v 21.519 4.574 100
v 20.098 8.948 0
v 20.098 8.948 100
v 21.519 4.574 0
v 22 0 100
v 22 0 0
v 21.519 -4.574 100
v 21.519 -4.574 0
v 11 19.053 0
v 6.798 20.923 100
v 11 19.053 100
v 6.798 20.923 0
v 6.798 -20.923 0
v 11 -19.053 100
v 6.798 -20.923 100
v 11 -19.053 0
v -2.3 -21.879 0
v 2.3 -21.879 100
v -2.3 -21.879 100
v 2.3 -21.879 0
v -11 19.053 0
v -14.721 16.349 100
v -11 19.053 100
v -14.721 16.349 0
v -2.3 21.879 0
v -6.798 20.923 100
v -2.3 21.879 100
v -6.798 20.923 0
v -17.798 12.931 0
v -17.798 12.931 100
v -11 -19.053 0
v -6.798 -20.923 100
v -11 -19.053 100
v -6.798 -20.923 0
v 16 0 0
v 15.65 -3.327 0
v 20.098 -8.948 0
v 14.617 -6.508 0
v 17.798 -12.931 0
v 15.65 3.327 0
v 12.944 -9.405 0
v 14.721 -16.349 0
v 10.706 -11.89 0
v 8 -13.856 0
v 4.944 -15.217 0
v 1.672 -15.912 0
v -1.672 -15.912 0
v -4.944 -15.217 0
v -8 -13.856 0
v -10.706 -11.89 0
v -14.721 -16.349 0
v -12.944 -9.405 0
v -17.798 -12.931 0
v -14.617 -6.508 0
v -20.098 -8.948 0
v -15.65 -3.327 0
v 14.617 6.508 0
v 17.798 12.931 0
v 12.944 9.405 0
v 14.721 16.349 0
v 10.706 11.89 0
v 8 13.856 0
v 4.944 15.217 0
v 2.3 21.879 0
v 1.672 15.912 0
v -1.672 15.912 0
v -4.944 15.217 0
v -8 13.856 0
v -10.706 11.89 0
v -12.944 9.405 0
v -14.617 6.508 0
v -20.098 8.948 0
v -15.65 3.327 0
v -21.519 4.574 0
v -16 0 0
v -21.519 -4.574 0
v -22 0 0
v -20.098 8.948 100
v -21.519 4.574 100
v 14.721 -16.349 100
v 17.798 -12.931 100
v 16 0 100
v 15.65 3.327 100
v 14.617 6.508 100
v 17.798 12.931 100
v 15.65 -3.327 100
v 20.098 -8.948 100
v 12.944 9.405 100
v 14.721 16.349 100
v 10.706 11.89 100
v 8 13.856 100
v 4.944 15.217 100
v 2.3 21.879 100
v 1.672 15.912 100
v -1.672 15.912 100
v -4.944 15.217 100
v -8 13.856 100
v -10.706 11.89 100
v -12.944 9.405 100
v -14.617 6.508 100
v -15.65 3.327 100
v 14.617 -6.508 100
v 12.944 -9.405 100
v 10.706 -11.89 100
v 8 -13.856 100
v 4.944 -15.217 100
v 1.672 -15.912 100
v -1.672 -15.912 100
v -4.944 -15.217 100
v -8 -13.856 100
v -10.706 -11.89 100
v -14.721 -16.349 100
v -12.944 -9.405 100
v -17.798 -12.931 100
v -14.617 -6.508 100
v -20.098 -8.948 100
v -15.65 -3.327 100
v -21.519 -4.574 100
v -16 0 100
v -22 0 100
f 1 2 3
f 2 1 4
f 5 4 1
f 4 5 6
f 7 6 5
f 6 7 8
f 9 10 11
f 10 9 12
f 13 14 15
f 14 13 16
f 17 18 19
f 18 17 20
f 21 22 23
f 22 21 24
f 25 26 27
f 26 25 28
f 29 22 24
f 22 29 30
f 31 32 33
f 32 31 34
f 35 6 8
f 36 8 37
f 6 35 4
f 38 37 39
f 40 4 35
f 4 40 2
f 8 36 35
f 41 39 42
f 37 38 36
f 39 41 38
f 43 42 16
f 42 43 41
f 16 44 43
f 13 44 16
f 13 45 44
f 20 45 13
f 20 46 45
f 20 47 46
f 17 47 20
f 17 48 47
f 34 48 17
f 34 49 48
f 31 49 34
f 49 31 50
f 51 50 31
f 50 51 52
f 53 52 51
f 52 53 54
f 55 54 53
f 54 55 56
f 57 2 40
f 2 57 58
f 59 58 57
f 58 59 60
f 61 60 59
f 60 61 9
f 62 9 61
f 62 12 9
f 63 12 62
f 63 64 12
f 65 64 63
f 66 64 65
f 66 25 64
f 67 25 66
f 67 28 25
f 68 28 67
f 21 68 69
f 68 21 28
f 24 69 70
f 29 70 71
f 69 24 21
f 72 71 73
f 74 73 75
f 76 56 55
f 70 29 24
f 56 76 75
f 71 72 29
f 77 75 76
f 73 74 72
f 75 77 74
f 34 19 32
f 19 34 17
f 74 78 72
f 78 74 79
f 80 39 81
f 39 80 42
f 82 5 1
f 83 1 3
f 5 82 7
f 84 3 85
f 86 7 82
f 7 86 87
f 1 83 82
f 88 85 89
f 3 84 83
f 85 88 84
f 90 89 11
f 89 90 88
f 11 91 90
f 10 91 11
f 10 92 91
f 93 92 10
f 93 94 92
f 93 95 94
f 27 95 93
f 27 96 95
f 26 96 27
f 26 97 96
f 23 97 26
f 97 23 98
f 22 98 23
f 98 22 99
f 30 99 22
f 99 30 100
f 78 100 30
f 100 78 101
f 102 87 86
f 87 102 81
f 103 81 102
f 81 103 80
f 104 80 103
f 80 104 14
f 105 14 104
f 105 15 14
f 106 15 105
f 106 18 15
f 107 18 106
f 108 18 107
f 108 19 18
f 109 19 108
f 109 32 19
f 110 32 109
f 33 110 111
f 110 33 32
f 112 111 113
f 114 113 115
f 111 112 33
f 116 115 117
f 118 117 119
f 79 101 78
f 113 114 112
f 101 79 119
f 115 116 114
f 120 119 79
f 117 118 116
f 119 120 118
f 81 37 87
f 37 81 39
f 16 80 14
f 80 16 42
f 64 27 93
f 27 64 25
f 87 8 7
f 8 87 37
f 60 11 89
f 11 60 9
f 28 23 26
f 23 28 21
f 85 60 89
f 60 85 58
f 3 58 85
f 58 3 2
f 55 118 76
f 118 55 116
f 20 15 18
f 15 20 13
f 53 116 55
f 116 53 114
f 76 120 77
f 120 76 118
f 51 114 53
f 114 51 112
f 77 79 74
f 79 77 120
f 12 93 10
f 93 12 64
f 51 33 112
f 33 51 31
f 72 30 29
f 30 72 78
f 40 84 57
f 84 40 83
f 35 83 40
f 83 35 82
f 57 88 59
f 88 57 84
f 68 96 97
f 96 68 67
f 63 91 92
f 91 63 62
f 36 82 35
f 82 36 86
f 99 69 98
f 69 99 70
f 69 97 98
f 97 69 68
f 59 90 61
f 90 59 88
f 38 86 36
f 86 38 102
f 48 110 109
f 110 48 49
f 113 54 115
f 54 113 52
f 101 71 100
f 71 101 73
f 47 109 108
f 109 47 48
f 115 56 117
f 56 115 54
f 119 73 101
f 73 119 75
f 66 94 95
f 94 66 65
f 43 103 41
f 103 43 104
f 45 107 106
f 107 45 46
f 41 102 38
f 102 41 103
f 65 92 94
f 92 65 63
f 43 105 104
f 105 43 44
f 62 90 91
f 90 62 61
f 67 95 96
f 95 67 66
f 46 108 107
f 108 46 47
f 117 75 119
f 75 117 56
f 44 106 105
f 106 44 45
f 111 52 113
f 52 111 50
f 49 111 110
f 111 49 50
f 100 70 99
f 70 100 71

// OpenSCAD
height = 100;
innerR = 16;
outerR = 22;

difference(){
    cylinder(h = height, r = outerR);
    cylinder(h = height+1, r = innerR);
}
